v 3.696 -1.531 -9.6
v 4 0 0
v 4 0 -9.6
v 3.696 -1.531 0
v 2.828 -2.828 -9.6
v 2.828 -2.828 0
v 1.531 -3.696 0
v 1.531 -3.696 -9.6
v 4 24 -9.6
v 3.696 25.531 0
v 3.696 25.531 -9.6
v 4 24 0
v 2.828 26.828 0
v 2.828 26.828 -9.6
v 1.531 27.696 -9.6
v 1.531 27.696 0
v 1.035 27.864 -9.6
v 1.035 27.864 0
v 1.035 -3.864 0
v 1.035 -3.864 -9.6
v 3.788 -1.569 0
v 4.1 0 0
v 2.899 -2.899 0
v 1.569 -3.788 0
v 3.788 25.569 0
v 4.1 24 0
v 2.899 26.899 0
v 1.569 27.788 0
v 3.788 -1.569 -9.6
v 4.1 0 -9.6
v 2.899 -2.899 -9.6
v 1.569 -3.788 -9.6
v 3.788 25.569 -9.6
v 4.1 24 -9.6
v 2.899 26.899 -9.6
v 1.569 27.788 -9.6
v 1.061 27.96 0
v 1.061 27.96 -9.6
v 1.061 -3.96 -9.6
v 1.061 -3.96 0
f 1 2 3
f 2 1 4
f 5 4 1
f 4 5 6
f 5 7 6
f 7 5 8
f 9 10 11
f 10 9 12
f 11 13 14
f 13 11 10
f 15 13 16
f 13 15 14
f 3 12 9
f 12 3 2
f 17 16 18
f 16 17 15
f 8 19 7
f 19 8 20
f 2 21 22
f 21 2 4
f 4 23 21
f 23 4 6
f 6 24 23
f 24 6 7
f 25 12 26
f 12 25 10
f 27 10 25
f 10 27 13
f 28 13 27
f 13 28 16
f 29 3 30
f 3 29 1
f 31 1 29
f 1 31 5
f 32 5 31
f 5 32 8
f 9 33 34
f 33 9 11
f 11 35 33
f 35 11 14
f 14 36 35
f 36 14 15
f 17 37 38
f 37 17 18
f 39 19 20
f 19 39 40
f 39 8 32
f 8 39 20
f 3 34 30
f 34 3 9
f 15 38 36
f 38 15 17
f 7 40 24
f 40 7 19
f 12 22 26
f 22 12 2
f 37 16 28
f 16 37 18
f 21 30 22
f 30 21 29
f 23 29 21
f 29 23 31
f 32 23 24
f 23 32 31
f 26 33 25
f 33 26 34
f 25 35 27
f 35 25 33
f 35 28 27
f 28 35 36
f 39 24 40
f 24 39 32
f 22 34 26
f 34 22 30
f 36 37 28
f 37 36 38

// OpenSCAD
// file: ../p/3-16ring40.scad
use <../lib.scad>
function ldraw_lib__3_16ring40() = [
// 0 Ring 40 x 0.1875
// 0 Name: 3-16ring40.dat
// 0 Author: Chris Böhnke [KnightOfTarenta]
// 0 !LDRAW_ORG Primitive UPDATE 2026-05
// 0 !LICENSE Licensed under CC BY 4.0 : see CAreadme.txt
// 
// 0 BFC CERTIFY CCW
  [0,"BFC","CERTIFY"],
  [0,"BFC","CCW"],
// 
// 0 !HISTORY 2026-05-31 [OrionP] Official Update 2026-05
// 
// 4 16 41 0 0 37.8799 0 15.6907 36.956 0 15.308 40 0 0
  [4,16,41,0,0,37.8799,0,15.6907,36.956,0,15.308,40,0,0],
// 4 16 37.8799 0 15.6907 28.9911 0 28.9911 28.284 0 28.284 36.956 0 15.308
  [4,16,37.8799,0,15.6907,28.9911,0,28.9911,28.284,0,28.284,36.956,0,15.308],
// 4 16 28.9911 0 28.9911 15.6907 0 37.8799 15.308 0 36.956 28.284 0 28.284
  [4,16,28.9911,0,28.9911,15.6907,0,37.8799,15.308,0,36.956,28.284,0,28.284],
// 0 // Build by LDPartEditor (PrimGen 2.X)
];
module ldraw_lib__3_16ring40(step=0, col=false, unit=2/5, alt=false, line=0.2, solid=!$preview)
    makepoly(ldraw_lib__3_16ring40(), step=step, col=col, unit=unit, alt=alt, line=line, solid=solid);
ldraw_lib__3_16ring40(line=0.2);
// file: s/4181b01.scad
use <../../lib.scad>
use <../../p/3-16cyli.scad>
use <../../p/3-16ring40.scad>
function ldraw_lib__s__4181b01() = [
// 0 ~Sticker  1.2 x  4.4 (Formed)
// 0 Name: s\4181b01.dat
// 0 Author: Chris Böhnke [KnightOfTarenta]
// 0 !LDRAW_ORG Subpart UPDATE 2026-05
// 0 !LICENSE Licensed under CC BY 4.0 : see CAreadme.txt
// 
// 0 BFC CERTIFY CCW
  [0,"BFC","CERTIFY"],
  [0,"BFC","CCW"],
// 
// 0 !HISTORY 2026-05-31 [OrionP] Official Update 2026-05
// 
// 0 // Sticker Back
// 0 BFC INVERTNEXT
  [0,"BFC","INVERTNEXT"],
// 1 16 0 0 0 10 0 0 0 24 0 0 0 -10 3-16cyli.dat
  [1,16,0,0,0,10,0,0,0,24,0,0,0,-10, ldraw_lib__3_16cyli()],
// 0 BFC INVERTNEXT
  [0,"BFC","INVERTNEXT"],
// 1 16 0 0 60 10 0 0 0 24 0 0 0 10 3-16cyli.dat
  [1,16,0,0,60,10,0,0,0,24,0,0,0,10, ldraw_lib__3_16cyli()],
// 4 16 10 24 0 10 0 0 10 0 60 10 24 60
  [4,16,10,24,0,10,0,0,10,0,60,10,24,60],
// 4 16 2.588 24 69.659 3.827 24 69.239 3.827 0 69.239 2.588 0 69.659
  [4,16,2.588,24,69.659,3.827,24,69.239,3.827,0,69.239,2.588,0,69.659],
// 4 16 3.827 0 -9.239 3.827 24 -9.239 2.588 24 -9.659 2.588 0 -9.659
  [4,16,3.827,0,-9.239,3.827,24,-9.239,2.588,24,-9.659,2.588,0,-9.659],
// 
// 0 // Sticker Sides
// 1 16 0 0 0 .25 0 0 0 1 0 0 0 -.25 3-16ring40.dat
  [1,16,0,0,0,.25,0,0,0,1,0,0,0,-.25, ldraw_lib__3_16ring40()],
// 1 16 0 0 60 .25 0 0 0 1 0 0 0 .25 3-16ring40.dat
  [1,16,0,0,60,.25,0,0,0,1,0,0,0,.25, ldraw_lib__3_16ring40()],
// 1 16 0 24 0 .25 0 0 0 -1 0 0 0 -.25 3-16ring40.dat
  [1,16,0,24,0,.25,0,0,0,-1,0,0,0,-.25, ldraw_lib__3_16ring40()],
// 1 16 0 24 60 .25 0 0 0 -1 0 0 0 .25 3-16ring40.dat
  [1,16,0,24,60,.25,0,0,0,-1,0,0,0,.25, ldraw_lib__3_16ring40()],
// 4 16 2.588 24 69.659 2.588 0 69.659 2.653 0 69.901 2.653 24 69.901
  [4,16,2.588,24,69.659,2.588,0,69.659,2.653,0,69.901,2.653,24,69.901],
// 4 16 2.588 24 -9.659 2.653 24 -9.901 2.653 0 -9.901 2.588 0 -9.659
  [4,16,2.588,24,-9.659,2.653,24,-9.901,2.653,0,-9.901,2.588,0,-9.659],
// 4 16 2.588 24 -9.659 3.827 24 -9.239 3.923 24 -9.47 2.653 24 -9.901
  [4,16,2.588,24,-9.659,3.827,24,-9.239,3.923,24,-9.47,2.653,24,-9.901],
// 4 16 10 24 60 10.25 24 60 10.25 24 0 10 24 0
  [4,16,10,24,60,10.25,24,60,10.25,24,0,10,24,0],
// 4 16 2.588 24 69.659 2.653 24 69.901 3.923 24 69.47 3.827 24 69.239
  [4,16,2.588,24,69.659,2.653,24,69.901,3.923,24,69.47,3.827,24,69.239],
// 4 16 3.923 0 -9.47 3.827 0 -9.239 2.588 0 -9.659 2.653 0 -9.901
  [4,16,3.923,0,-9.47,3.827,0,-9.239,2.588,0,-9.659,2.653,0,-9.901],
// 4 16 10 0 60 10 0 0 10.25 0 0 10.25 0 60
  [4,16,10,0,60,10,0,0,10.25,0,0,10.25,0,60],
// 4 16 2.588 0 69.659 3.827 0 69.239 3.923 0 69.47 2.653 0 69.901
  [4,16,2.588,0,69.659,3.827,0,69.239,3.923,0,69.47,2.653,0,69.901],
];
module ldraw_lib__s__4181b01(step=0, col=false, unit=2/5, alt=false, line=0.2, solid=!$preview)
    makepoly(ldraw_lib__s__4181b01(), step=step, col=col, unit=unit, alt=alt, line=line, solid=solid);
ldraw_lib__s__4181b01(line=0.2);
// file: ../p/3-16cyli.scad
use <../lib.scad>
function ldraw_lib__3_16cyli() = [
// 0 Cylinder 0.1875
// 0 Name: 3-16cyli.dat
// 0 Author: Mark Kennedy [mkennedy]
// 0 !LDRAW_ORG Primitive UPDATE 2005-01
// 0 !LICENSE Licensed under CC BY 4.0 : see CAreadme.txt
// 
// 0 BFC CERTIFY CCW
  [0,"BFC","CERTIFY"],
  [0,"BFC","CCW"],
// 
// 0 !HISTORY 2004-03-02 [PTadmin] Official Update 2004-01
// 0 !HISTORY 2004-12-11 [nielsk] Recreated using Primitive Generator, Edge lines fixed, BFC changed to CCW
// 0 !HISTORY 2005-12-28 [PTadmin] Official Update 2005-01
// 0 !HISTORY 2007-06-24 [PTadmin] Header formatted for Contributor Agreement
// 0 !HISTORY 2008-07-01 [PTadmin] Official Update 2008-01
// 
// 
// 4 16 .9239 1 .3827 .9239 0 .3827 1 0 0 1 1 0
  [4,16,.9239,1,.3827,.9239,0,.3827,1,0,0,1,1,0],
// 4 16 .7071 1 .7071 .7071 0 .7071 .9239 0 .3827 .9239 1 .3827
  [4,16,.7071,1,.7071,.7071,0,.7071,.9239,0,.3827,.9239,1,.3827],
// 4 16 .3827 1 .9239 .3827 0 .9239 .7071 0 .7071 .7071 1 .7071
  [4,16,.3827,1,.9239,.3827,0,.9239,.7071,0,.7071,.7071,1,.7071],
// 5 24 1 1 0 1 0 0 1 1 -.4142 .9239 1 .3827
  [5,24,1,1,0,1,0,0,1,1,-.4142,.9239,1,.3827],
// 5 24 .9239 1 .3827 .9239 0 .3827 1 1 0 .7071 1 .7071
  [5,24,.9239,1,.3827,.9239,0,.3827,1,1,0,.7071,1,.7071],
// 5 24 .7071 1 .7071 .7071 0 .7071 .9239 1 .3827 .3827 1 .9239
  [5,24,.7071,1,.7071,.7071,0,.7071,.9239,1,.3827,.3827,1,.9239],
// 5 24 .3827 1 .9239 .3827 0 .9239 .7071 1 .7071 0 1 1.0824
  [5,24,.3827,1,.9239,.3827,0,.9239,.7071,1,.7071,0,1,1.0824],
// 0
];
module ldraw_lib__3_16cyli(step=0, col=false, unit=2/5, alt=false, line=0.2, solid=!$preview)
    makepoly(ldraw_lib__3_16cyli(), step=step, col=col, unit=unit, alt=alt, line=line, solid=solid);
ldraw_lib__3_16cyli(line=0.2);
// main file
use <../lib.scad>
use <../p/3-16cyli.scad>
use <s/4181b01.scad>
function ldraw_lib__821437cc01() = [
// 0 Sticker  1.2 x  4.4 Yellow (Formed)
// 0 Name: 821437cc01.dat
// 0 Author: Chris Böhnke [KnightOfTarenta]
// 0 !LDRAW_ORG Part UPDATE 2026-05
// 0 !LICENSE Licensed under CC BY 4.0 : see CAreadme.txt
// 
// 0 BFC CERTIFY CCW
  [0,"BFC","CERTIFY"],
  [0,"BFC","CCW"],
// 
// 0 !KEYWORDS Bricklink 5581stk01, Brickowl 997456, Magic Flash, Model Team
// 0 !KEYWORDS Rebrickable 821437, Set 5581, van
// 
// 0 !HISTORY 2026-05-31 [OrionP] Official Update 2026-05
// 
// 0 // Sticker Back
// 1 16 0 0 0 1 0 0 0 1 0 0 0 1 s\4181b01.dat
  [1,16,0,0,0,1,0,0,0,1,0,0,0,1, ldraw_lib__s__4181b01()],
// 
// 0 // Sticker Pattern
// 1 14 0 0 0 10.25 0 0 0 24 0 0 0 -10.25 3-16cyli.dat
  [1,14,0,0,0,10.25,0,0,0,24,0,0,0,-10.25, ldraw_lib__3_16cyli()],
// 1 14 0 0 60 10.25 0 0 0 24 0 0 0 10.25 3-16cyli.dat
  [1,14,0,0,60,10.25,0,0,0,24,0,0,0,10.25, ldraw_lib__3_16cyli()],
// 4 14 2.653 24 -9.901 3.923 24 -9.47 3.923 0 -9.47 2.653 0 -9.901
  [4,14,2.653,24,-9.901,3.923,24,-9.47,3.923,0,-9.47,2.653,0,-9.901],
// 4 14 10.25 24 60 10.25 0 60 10.25 0 0 10.25 24 0
  [4,14,10.25,24,60,10.25,0,60,10.25,0,0,10.25,24,0],
// 4 14 3.923 0 69.47 3.923 24 69.47 2.653 24 69.901 2.653 0 69.901
  [4,14,3.923,0,69.47,3.923,24,69.47,2.653,24,69.901,2.653,0,69.901],
];
module ldraw_lib__821437cc01(step=0, col=false, unit=2/5, alt=false, line=0.2, solid=!$preview)
    makepoly(ldraw_lib__821437cc01(), step=step, col=col, unit=unit, alt=alt, line=line, solid=solid);
ldraw_lib__821437cc01(line=0.2);
